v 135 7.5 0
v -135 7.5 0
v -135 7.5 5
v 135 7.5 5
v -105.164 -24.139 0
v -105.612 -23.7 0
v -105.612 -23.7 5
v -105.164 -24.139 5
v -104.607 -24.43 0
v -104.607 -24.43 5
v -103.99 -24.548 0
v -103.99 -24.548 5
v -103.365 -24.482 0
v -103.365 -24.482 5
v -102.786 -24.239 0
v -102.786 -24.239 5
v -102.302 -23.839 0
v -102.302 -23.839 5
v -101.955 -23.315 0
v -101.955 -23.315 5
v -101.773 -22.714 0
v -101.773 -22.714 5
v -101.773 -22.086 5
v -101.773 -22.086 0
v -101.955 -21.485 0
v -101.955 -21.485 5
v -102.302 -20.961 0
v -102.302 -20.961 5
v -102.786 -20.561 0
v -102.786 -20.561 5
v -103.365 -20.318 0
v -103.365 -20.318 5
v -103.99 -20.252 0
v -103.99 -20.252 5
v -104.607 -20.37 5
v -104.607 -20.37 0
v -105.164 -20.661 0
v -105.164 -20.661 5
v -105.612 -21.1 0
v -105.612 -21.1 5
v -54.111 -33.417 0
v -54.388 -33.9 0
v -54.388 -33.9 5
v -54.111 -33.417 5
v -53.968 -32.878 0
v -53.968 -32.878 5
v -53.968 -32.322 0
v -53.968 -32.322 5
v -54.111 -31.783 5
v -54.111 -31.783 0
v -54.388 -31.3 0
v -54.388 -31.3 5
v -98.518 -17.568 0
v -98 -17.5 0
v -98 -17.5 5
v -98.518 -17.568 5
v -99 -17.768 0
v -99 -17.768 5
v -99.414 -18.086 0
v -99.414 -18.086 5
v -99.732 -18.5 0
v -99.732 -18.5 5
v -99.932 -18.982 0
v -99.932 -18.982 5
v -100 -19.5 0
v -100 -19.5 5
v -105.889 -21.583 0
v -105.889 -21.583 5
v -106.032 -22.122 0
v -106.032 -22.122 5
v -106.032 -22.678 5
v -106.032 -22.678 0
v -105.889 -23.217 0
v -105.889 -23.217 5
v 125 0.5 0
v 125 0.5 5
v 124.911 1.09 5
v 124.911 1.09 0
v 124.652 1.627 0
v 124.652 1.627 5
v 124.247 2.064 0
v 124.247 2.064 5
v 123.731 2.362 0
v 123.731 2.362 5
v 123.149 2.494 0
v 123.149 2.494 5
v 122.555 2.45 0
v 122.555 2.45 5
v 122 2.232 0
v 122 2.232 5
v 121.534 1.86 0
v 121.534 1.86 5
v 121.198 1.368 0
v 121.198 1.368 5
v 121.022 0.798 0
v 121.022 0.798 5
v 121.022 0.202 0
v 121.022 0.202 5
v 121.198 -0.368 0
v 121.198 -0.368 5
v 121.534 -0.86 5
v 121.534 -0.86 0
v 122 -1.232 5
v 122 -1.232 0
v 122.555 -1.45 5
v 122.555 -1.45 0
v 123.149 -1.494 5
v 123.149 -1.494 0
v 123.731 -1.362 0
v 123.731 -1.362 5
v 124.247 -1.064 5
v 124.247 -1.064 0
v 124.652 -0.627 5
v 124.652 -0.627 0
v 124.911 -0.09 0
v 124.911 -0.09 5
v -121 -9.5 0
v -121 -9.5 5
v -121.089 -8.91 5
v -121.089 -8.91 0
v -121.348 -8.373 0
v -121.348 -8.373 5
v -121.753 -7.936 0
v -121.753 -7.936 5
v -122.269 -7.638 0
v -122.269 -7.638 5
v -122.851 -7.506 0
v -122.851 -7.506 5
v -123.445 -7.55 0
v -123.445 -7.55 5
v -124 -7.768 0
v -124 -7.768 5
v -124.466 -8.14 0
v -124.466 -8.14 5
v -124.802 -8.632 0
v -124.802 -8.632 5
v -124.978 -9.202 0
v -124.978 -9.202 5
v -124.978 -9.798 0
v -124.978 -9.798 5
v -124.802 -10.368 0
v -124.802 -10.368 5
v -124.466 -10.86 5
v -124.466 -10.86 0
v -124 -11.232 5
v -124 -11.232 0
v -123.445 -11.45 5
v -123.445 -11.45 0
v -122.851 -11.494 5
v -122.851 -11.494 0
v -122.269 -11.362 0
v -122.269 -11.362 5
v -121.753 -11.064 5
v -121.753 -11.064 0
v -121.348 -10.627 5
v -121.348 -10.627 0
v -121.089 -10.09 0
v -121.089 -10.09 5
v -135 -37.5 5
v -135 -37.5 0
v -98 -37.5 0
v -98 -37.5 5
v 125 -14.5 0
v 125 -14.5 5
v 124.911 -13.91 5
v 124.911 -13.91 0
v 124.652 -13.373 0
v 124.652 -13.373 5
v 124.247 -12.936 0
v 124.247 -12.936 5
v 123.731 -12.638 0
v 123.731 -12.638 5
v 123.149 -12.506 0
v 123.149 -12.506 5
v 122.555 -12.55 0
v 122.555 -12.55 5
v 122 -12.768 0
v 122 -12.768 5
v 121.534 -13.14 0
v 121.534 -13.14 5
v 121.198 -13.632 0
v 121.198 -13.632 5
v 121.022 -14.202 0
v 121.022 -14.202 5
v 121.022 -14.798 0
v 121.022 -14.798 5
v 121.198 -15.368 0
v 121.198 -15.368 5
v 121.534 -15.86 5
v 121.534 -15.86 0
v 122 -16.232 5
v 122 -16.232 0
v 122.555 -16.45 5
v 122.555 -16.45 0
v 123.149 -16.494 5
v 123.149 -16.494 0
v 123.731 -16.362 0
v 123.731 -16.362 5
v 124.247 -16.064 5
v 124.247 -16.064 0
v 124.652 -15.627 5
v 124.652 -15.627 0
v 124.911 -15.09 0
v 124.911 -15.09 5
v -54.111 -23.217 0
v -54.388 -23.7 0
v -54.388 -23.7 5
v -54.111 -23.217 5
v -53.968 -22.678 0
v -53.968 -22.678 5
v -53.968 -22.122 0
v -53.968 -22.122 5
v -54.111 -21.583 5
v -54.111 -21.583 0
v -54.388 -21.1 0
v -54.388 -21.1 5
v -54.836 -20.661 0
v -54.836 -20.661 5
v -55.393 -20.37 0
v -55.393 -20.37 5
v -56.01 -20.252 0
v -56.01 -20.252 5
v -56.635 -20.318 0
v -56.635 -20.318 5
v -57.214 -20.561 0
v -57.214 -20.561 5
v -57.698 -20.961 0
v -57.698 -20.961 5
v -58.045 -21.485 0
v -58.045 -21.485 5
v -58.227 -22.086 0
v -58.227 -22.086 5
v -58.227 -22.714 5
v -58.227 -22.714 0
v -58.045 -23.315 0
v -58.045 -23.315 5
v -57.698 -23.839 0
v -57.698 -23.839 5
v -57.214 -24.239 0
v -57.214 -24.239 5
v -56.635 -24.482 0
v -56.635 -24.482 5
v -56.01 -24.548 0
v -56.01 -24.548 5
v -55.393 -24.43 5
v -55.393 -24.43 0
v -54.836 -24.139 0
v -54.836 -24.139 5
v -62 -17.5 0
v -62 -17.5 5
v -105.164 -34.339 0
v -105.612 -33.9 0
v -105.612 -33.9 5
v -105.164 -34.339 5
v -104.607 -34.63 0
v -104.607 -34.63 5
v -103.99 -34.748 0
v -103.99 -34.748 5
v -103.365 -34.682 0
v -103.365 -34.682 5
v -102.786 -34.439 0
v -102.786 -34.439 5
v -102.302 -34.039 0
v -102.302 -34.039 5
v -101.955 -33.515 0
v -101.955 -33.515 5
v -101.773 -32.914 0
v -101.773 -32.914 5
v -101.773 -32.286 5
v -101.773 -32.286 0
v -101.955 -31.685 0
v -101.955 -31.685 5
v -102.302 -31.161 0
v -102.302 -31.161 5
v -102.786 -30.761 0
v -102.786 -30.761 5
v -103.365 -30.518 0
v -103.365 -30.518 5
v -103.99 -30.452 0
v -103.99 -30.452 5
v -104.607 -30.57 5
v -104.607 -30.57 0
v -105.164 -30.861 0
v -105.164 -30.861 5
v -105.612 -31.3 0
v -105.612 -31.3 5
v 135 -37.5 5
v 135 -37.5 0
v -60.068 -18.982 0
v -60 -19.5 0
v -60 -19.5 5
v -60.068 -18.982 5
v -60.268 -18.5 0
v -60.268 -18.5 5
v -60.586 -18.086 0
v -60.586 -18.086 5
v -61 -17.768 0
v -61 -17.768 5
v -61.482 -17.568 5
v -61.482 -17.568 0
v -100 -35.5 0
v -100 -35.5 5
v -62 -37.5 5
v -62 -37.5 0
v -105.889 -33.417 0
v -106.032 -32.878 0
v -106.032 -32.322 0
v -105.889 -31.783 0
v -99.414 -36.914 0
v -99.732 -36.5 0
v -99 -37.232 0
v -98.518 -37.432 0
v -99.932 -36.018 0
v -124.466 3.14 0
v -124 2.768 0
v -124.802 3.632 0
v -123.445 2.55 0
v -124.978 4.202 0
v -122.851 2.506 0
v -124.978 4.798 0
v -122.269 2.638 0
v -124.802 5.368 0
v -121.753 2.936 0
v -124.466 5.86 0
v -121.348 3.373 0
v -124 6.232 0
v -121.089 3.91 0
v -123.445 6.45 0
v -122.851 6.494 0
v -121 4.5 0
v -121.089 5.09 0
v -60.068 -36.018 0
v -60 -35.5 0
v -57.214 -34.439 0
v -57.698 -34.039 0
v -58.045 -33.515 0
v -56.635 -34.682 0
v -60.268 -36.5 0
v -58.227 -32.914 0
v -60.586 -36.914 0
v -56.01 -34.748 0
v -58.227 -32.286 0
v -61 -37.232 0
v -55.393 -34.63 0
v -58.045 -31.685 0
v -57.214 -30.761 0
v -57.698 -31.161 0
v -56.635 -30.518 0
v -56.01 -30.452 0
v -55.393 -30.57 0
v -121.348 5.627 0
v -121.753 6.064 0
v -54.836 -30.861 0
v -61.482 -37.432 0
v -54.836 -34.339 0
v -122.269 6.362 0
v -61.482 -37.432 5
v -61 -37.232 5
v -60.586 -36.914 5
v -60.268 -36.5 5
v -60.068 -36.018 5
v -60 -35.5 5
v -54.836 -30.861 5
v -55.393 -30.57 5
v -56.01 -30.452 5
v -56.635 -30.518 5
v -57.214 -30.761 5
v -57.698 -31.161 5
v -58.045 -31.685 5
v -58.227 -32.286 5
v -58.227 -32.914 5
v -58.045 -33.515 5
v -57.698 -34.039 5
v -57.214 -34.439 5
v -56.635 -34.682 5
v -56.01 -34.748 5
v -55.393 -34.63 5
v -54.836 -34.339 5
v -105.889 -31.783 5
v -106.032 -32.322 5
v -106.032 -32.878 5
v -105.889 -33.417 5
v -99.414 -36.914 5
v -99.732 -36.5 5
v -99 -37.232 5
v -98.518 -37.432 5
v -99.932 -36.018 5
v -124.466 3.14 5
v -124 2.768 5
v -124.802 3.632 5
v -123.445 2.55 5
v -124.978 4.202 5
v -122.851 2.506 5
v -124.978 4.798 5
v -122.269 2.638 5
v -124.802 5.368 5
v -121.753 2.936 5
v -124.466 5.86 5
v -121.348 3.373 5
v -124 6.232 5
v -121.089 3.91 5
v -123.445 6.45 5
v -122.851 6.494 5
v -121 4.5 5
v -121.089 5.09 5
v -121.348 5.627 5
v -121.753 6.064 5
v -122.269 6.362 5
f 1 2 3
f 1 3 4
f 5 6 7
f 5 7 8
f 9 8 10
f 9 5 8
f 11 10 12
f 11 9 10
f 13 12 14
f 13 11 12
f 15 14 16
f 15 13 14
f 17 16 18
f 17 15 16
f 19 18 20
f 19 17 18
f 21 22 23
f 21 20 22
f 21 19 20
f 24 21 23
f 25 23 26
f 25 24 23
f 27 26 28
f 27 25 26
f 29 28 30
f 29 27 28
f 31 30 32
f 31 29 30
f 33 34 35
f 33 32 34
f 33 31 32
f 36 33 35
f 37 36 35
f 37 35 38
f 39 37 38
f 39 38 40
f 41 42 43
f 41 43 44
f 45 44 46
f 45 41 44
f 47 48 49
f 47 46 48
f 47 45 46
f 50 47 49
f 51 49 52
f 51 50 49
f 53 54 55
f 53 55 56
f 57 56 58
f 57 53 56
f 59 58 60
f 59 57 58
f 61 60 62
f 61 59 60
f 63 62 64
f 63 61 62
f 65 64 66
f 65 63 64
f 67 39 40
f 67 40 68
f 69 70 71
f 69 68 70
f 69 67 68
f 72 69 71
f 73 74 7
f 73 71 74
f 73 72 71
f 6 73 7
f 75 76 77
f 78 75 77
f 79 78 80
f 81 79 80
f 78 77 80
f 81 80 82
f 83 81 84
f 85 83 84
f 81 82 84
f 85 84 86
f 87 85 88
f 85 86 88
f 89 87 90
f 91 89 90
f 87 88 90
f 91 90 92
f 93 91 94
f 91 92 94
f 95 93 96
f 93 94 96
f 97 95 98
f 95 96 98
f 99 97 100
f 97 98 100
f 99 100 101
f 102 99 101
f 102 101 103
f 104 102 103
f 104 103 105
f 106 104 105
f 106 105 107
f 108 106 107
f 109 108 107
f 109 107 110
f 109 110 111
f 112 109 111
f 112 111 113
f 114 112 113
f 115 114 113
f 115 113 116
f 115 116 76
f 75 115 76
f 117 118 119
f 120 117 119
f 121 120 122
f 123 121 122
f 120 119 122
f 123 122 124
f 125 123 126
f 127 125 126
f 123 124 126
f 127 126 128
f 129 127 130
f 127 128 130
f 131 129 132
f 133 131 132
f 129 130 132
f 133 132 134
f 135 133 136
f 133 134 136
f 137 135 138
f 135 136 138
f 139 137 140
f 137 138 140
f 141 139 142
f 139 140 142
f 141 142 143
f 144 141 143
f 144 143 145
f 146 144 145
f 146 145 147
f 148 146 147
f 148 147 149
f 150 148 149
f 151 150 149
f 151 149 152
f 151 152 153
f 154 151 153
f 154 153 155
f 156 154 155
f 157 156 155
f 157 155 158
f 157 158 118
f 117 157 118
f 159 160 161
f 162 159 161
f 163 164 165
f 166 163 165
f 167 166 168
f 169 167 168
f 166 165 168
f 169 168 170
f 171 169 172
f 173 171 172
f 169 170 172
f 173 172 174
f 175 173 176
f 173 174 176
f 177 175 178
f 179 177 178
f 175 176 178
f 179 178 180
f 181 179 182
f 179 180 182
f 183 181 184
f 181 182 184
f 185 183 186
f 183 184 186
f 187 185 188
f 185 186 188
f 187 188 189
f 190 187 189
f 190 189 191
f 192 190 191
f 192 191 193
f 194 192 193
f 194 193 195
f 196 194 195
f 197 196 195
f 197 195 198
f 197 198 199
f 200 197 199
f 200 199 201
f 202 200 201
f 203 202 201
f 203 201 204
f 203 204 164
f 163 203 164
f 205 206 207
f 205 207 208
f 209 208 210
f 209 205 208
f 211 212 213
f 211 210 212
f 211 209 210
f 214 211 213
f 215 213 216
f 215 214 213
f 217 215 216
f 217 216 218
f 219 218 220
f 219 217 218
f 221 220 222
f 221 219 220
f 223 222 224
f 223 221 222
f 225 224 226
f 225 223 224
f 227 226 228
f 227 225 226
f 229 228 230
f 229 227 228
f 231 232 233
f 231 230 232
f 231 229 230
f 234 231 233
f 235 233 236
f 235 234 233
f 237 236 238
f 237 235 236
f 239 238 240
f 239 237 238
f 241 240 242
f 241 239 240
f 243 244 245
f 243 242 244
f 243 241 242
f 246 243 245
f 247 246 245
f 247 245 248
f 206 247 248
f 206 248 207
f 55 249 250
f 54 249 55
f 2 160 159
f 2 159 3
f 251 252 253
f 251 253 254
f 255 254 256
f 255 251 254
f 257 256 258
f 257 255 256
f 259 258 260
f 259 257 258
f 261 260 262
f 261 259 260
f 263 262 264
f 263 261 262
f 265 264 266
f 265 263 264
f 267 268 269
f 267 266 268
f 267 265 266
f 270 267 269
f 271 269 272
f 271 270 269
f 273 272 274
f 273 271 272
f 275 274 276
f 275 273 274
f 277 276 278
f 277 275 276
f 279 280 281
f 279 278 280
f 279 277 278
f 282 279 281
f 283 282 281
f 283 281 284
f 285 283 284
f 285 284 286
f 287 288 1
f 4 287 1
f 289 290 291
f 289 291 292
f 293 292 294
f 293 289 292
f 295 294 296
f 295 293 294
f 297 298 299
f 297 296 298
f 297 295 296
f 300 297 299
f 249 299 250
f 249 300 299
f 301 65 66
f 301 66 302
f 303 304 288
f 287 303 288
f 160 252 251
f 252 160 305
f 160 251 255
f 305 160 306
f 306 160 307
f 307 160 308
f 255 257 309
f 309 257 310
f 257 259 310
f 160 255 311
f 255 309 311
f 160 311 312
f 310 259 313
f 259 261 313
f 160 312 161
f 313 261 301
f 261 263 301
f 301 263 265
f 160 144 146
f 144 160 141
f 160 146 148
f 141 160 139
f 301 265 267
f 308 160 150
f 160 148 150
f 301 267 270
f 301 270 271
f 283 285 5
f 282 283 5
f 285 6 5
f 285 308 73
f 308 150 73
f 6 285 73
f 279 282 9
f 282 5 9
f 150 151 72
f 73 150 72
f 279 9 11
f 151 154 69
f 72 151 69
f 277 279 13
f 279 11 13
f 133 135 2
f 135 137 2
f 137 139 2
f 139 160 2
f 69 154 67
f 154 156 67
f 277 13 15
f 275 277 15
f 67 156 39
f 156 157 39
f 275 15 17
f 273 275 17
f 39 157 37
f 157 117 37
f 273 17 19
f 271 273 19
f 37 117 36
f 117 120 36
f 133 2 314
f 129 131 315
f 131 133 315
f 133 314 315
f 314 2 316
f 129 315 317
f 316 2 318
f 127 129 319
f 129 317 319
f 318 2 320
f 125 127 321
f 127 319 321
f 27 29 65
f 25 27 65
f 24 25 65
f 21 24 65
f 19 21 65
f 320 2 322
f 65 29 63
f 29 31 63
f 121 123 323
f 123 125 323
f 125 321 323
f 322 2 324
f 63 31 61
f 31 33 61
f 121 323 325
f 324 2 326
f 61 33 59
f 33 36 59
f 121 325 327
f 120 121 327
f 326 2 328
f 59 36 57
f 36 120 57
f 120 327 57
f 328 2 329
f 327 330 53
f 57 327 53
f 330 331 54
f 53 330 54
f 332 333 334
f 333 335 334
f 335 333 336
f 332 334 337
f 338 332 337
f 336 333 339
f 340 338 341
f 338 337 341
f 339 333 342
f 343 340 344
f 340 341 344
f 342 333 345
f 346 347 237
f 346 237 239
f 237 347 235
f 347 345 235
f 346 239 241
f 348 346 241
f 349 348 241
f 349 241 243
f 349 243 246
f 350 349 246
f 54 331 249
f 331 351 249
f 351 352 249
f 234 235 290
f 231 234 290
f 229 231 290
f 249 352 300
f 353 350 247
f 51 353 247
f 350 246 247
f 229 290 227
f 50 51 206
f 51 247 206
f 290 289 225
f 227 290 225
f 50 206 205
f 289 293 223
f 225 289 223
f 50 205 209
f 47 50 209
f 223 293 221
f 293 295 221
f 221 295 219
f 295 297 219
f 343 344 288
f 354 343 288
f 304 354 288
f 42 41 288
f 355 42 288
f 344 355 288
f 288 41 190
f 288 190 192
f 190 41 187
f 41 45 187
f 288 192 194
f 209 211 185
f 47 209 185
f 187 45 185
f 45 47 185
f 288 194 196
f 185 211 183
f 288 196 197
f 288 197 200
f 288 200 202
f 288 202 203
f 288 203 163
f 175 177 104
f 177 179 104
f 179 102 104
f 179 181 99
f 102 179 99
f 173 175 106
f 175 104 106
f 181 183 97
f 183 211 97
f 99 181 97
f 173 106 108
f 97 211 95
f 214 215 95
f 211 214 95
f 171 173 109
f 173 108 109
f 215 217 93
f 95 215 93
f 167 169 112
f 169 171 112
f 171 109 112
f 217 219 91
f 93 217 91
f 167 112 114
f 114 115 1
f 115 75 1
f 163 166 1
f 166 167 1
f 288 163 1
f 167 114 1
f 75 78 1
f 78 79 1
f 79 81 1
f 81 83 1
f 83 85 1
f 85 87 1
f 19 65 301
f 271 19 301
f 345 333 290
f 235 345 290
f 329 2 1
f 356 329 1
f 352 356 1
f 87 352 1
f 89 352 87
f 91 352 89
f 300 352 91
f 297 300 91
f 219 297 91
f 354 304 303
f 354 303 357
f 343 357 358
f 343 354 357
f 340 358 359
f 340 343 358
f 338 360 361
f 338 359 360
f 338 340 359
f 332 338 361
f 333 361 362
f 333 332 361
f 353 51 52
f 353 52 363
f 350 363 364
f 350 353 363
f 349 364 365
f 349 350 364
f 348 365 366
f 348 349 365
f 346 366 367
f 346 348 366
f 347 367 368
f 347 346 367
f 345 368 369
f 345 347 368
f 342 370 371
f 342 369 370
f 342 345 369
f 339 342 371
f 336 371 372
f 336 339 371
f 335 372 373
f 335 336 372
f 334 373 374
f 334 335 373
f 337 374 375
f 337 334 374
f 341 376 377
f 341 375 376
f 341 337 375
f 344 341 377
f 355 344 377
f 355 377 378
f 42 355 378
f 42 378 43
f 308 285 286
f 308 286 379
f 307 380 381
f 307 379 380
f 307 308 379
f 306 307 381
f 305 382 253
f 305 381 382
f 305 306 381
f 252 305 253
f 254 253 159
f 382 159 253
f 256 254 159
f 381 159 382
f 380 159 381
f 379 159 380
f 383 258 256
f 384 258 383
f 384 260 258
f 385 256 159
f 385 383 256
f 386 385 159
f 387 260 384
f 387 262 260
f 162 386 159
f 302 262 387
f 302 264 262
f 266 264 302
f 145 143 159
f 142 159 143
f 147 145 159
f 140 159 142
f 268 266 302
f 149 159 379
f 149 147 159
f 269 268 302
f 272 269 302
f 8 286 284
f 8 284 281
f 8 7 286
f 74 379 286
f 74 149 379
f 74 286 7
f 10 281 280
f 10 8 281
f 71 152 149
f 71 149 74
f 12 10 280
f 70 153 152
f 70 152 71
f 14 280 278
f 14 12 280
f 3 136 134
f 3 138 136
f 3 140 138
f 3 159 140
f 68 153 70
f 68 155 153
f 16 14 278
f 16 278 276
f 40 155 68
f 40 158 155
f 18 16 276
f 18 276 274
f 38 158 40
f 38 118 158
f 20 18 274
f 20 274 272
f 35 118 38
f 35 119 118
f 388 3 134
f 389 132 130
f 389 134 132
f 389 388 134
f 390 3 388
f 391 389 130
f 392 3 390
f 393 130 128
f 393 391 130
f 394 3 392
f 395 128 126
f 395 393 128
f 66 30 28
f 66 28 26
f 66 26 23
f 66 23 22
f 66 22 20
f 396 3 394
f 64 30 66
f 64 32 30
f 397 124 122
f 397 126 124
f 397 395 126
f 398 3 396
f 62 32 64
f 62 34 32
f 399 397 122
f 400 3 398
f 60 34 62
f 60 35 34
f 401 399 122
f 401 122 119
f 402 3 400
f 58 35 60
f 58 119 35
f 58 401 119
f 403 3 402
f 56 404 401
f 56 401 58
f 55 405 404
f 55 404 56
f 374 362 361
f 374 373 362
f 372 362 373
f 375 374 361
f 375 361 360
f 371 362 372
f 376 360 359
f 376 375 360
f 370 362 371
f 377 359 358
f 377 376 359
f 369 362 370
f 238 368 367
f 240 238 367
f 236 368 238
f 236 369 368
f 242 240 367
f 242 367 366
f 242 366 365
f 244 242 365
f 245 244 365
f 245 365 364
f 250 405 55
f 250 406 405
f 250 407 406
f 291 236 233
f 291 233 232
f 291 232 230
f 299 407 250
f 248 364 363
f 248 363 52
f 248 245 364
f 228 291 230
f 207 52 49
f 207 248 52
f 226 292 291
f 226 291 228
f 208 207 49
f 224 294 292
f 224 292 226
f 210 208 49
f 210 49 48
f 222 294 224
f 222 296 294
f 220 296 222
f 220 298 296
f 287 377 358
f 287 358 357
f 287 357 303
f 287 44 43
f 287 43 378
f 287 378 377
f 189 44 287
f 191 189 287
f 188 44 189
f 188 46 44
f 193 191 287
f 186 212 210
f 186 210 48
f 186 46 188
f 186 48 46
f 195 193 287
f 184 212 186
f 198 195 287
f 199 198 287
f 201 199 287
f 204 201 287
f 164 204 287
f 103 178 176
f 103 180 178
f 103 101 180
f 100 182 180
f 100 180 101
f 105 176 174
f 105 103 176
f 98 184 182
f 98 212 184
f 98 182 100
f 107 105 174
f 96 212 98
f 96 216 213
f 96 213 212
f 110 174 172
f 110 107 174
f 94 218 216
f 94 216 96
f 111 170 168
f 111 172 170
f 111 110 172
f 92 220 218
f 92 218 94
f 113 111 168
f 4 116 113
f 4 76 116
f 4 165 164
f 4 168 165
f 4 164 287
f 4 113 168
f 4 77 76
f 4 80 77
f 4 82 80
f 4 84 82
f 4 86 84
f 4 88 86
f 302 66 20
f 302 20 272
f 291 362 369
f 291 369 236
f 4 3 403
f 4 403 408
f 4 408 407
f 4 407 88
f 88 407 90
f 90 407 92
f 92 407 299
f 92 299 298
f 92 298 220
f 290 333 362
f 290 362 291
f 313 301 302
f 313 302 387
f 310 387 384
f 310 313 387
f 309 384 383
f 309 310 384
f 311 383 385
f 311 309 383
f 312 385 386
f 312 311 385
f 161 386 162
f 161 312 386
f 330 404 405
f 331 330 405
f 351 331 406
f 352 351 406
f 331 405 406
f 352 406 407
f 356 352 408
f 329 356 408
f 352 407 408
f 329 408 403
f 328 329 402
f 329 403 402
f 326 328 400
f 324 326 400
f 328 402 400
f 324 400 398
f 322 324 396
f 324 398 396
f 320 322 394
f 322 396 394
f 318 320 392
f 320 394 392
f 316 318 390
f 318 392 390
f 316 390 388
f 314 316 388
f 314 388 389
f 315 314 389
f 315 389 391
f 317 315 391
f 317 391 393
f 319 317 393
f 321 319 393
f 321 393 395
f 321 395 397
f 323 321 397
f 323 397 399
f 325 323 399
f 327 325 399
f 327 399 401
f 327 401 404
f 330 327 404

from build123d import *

# Parameters (mm, degrees)
ESQUISSE1_W                  = 270
ESQUISSE1_H                  = 75
BOSS_EXTRU_1_DEPTH           = 5
ESQUISSE2_R                  = 2
ENL_V_MAT_EXTRU_1_DEPTH      = 141.200748928
ENL_V_MAT_EXTRU_2_DEPTH      = 141.200748928
ENL_V_MAT_EXTRU_2_DEPTH_BACK = 141.200748928
ESQUISSE4_W                  = 270
ESQUISSE4_H                  = 5
ENL_V_MAT_EXTRU_3_DEPTH      = 30


with BuildPart() as part:
    # Esquisse1 → Boss.-Extru.1 (new body)
    with BuildSketch(Plane.XY):
        Rectangle(ESQUISSE1_W, ESQUISSE1_H)
    extrude(amount=BOSS_EXTRU_1_DEPTH)

    # Esquisse2 → Enlèv. mat.-Extru.1 (cut, through all)
    with BuildSketch(Plane.XY.offset(5)):
        with Locations((123, 0.5)):
            Circle(ESQUISSE2_R)
        with Locations((123, -14.5)):
            Circle(ESQUISSE2_R)
        with Locations((-123, 4.5)):
            Circle(ESQUISSE2_R)
        with Locations((-123, -9.5)):
            Circle(ESQUISSE2_R)
    extrude(amount=-ENL_V_MAT_EXTRU_1_DEPTH, mode=Mode.SUBTRACT)

    # Esquisse3 → Enlèv. mat.-Extru.2 (cut, two sides: drawn at the far end of the back side and taken through both)
    with BuildSketch(Plane.XY.offset(5).offset(-ENL_V_MAT_EXTRU_2_DEPTH_BACK)):
        with BuildLine():
            Line((-98, -37.5), (-62, -37.5))
            ThreePointArc((-62, -37.5), (-60.585786438, -36.914213562), (-60, -35.5))
            Line((-60, -35.5), (-60, -19.5))
            ThreePointArc((-60, -19.5), (-60.585786438, -18.085786438), (-62, -17.5))
            Line((-62, -17.5), (-98, -17.5))
            ThreePointArc((-98, -17.5), (-99.414213562, -18.085786438), (-100, -19.5))
            Line((-100, -19.5), (-100, -35.5))
            ThreePointArc((-100, -35.5), (-99.414213562, -36.914213562), (-98, -37.5))
        make_face()
        with BuildLine():
            ThreePointArc((-54.387545621, -31.3), (-58.25, -32.6), (-54.387545621, -33.9))
            ThreePointArc((-54.387545621, -33.9), (-53.95, -32.6), (-54.387545621, -31.3))
        make_face()
        with BuildLine():
            ThreePointArc((-54.387545621, -21.1), (-58.25, -22.4), (-54.387545621, -23.7))
            ThreePointArc((-54.387545621, -23.7), (-53.95, -22.4), (-54.387545621, -21.1))
        make_face()
        with BuildLine():
            ThreePointArc((-105.612454379, -33.9), (-101.75, -32.6), (-105.612454379, -31.3))
            ThreePointArc((-105.612454379, -31.3), (-106.05, -32.6), (-105.612454379, -33.9))
        make_face()
        with BuildLine():
            ThreePointArc((-105.612454379, -23.7), (-101.75, -22.4), (-105.612454379, -21.1))
            ThreePointArc((-105.612454379, -21.1), (-106.05, -22.4), (-105.612454379, -23.7))
        make_face()
    extrude(amount=ENL_V_MAT_EXTRU_2_DEPTH + ENL_V_MAT_EXTRU_2_DEPTH_BACK, mode=Mode.SUBTRACT)

    # Esquisse4 → Enlèv. mat.-Extru.3 (cut)
    with BuildSketch(Plane(origin=(0, 37.5, 0), x_dir=(1, 0, 0), z_dir=(0, 1, 0))):
        with Locations((0, -2.5)):
            Rectangle(ESQUISSE4_W, ESQUISSE4_H)
    extrude(amount=-ENL_V_MAT_EXTRU_3_DEPTH, mode=Mode.SUBTRACT)


solid = part.part
